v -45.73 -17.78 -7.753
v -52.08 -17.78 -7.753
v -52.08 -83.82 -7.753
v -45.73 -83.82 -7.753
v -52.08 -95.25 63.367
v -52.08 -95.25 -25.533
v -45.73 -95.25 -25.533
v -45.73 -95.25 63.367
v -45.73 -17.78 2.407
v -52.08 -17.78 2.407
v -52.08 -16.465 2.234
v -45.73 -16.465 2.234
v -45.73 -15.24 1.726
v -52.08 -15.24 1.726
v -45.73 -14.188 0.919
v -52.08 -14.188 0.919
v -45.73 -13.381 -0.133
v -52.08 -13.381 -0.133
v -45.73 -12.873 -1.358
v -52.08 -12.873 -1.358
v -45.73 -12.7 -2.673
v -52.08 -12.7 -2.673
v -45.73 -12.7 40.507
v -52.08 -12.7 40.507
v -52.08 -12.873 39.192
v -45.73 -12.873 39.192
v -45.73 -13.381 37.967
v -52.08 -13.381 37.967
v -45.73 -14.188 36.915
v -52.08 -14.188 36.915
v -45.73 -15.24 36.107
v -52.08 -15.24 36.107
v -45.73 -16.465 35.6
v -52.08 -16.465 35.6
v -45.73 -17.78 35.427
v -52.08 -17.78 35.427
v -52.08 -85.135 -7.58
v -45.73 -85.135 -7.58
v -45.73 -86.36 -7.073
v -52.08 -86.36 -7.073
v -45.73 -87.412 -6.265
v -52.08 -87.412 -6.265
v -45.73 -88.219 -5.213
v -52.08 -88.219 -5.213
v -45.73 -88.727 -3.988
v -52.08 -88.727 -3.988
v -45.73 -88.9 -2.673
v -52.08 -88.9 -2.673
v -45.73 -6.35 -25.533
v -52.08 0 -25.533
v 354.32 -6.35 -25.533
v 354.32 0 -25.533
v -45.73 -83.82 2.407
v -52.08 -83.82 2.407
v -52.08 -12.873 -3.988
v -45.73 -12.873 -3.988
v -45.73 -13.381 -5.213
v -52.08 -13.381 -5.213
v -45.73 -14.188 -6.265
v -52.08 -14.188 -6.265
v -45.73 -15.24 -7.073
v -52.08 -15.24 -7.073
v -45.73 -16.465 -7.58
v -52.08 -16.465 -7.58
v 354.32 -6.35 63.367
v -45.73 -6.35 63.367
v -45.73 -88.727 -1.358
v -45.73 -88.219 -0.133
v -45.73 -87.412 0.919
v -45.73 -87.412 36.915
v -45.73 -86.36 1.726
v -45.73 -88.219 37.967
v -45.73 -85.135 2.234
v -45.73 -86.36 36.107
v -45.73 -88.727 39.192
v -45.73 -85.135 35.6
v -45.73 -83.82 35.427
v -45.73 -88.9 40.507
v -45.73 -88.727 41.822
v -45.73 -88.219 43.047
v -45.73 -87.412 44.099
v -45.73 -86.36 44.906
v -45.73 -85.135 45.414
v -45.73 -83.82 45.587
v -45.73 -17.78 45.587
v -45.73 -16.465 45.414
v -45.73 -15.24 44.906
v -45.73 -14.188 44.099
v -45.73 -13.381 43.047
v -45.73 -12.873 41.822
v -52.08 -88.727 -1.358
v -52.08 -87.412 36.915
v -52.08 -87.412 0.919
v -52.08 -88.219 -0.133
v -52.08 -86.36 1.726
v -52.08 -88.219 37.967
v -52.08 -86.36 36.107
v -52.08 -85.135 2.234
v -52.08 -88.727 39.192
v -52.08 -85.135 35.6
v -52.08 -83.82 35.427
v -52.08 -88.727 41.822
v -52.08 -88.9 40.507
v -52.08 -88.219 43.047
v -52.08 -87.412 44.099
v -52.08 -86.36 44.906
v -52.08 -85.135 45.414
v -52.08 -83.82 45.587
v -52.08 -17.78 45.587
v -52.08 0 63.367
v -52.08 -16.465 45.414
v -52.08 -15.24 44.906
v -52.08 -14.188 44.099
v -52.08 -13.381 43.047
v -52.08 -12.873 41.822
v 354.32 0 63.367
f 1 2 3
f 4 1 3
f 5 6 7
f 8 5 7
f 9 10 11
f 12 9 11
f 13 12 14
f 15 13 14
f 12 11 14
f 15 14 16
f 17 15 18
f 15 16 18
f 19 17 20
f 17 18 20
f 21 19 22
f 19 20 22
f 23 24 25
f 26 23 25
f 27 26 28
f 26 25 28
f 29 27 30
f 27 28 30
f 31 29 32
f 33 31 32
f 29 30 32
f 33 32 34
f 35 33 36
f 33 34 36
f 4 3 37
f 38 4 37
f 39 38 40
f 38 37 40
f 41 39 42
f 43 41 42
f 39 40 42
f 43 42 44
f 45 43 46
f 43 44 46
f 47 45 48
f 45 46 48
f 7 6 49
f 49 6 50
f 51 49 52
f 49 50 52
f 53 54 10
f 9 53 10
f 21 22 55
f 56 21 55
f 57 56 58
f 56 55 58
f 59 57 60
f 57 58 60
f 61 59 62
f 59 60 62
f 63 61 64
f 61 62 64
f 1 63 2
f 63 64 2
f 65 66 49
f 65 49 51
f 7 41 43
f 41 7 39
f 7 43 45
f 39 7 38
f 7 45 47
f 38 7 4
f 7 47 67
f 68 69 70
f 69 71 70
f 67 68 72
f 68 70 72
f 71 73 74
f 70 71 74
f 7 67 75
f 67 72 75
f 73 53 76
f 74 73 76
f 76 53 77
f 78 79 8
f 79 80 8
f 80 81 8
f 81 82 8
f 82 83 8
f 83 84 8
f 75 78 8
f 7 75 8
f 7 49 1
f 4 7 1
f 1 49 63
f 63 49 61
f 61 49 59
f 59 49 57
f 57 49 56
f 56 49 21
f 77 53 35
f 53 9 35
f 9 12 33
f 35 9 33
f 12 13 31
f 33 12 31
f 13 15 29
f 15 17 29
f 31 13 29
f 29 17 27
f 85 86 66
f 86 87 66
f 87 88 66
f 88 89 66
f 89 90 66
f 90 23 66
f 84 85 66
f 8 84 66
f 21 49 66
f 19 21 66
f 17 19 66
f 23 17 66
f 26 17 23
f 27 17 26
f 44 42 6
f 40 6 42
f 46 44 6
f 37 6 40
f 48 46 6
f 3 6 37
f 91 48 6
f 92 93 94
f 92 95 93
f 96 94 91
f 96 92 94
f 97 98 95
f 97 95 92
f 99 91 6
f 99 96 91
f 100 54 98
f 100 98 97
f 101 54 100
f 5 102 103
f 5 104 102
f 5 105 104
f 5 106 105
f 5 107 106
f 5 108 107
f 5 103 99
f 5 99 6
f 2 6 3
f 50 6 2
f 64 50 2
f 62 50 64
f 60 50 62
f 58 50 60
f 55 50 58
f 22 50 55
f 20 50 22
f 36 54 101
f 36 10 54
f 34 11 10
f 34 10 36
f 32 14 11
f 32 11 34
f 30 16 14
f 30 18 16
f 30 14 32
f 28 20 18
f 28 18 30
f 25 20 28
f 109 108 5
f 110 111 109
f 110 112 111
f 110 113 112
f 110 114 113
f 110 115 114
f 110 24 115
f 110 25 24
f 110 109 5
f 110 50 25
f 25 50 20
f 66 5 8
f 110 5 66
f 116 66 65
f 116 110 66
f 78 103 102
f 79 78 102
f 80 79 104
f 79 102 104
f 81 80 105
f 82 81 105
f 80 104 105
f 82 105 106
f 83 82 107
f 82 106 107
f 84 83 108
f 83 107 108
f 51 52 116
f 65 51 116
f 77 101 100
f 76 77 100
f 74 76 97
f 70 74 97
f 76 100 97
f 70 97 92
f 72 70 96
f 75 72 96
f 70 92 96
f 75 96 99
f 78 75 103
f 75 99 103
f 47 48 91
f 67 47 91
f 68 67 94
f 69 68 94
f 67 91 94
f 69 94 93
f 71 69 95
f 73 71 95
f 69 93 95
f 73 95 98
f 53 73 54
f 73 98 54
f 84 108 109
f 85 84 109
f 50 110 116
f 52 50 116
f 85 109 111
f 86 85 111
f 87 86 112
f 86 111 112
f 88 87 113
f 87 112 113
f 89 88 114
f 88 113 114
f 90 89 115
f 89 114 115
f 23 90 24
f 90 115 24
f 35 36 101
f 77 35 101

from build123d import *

# Parameters (mm, degrees)
F0_W     = 406.4
F0_H     = 88.9
F1_DEPTH = 6.35
F2_W     = 6.35
F2_H     = 88.9
F3_DEPTH = 88.9
F5_DEPTH = 25.4


with BuildPart() as f1:
    # F0 (on Front) → F1 (new body)
    with BuildSketch(Plane.XZ):
        with Locations((151.11976, 18.916855)):
            Rectangle(F0_W, F0_H)
    extrude(amount=F1_DEPTH)

    # F2 (on face) → F3 (join)
    with BuildSketch(Plane.XZ.offset(6.35)):
        with Locations((-48.90524, 18.916855)):
            Rectangle(F2_W, F2_H)
    extrude(amount=F3_DEPTH)

    # F4 (on face) → F5 (cut)
    with BuildSketch(Plane(origin=(-52.08024, 0, 0), x_dir=(0, -1, 0), z_dir=(-1, 0, 0))):
        with BuildLine():
            Line((17.78, 35.426855), (17.78, 45.586855))
            ThreePointArc((17.78, 45.586855), (14.187898, 44.098957), (12.7, 40.506855))
            ThreePointArc((12.7, 40.506855), (14.187898, 36.914752), (17.78, 35.426855))
        make_face()
        with BuildLine():
            ThreePointArc((22.86, 40.506855), (21.372102, 44.098957), (17.78, 45.586855))
            Line((17.78, 45.586855), (17.78, 35.426855))
            ThreePointArc((17.78, 35.426855), (21.372102, 36.914752), (22.86, 40.506855))
        make_face()
        with BuildLine():
            ThreePointArc((12.7, -2.673145), (14.187898, -6.265248), (17.78, -7.753145))
            Line((17.78, -7.753145), (17.78, 2.406855))
            ThreePointArc((17.78, 2.406855), (14.187898, 0.918957), (12.7, -2.673145))
        make_face()
        with BuildLine():
            Line((17.78, 2.406855), (17.78, -7.753145))
            ThreePointArc((17.78, -7.753145), (21.372102, -6.265248), (22.86, -2.673145))
            ThreePointArc((22.86, -2.673145), (21.372102, 0.918957), (17.78, 2.406855))
        make_face()
        with BuildLine():
            ThreePointArc((83.82, 35.426855), (78.74, 40.506855), (83.82, 45.586855))
            Line((83.82, 45.586855), (17.78, 45.586855))
            ThreePointArc((17.78, 45.586855), (21.372102, 44.098957), (22.86, 40.506855))
            ThreePointArc((22.86, 40.506855), (21.372102, 36.914752), (17.78, 35.426855))
            Line((17.78, 35.426855), (83.82, 35.426855))
        make_face()
        with BuildLine():
            Line((83.82, 35.426855), (83.82, 45.586855))
            ThreePointArc((83.82, 45.586855), (78.74, 40.506855), (83.82, 35.426855))
        make_face()
        with BuildLine():
            ThreePointArc((83.82, 35.426855), (87.412102, 36.914752), (88.9, 40.506855))
            ThreePointArc((88.9, 40.506855), (87.412102, 44.098957), (83.82, 45.586855))
            Line((83.82, 45.586855), (83.82, 35.426855))
        make_face()
        with BuildLine():
            Line((17.78, -7.753145), (83.82, -7.753145))
            ThreePointArc((83.82, -7.753145), (78.74, -2.673145), (83.82, 2.406855))
            Line((83.82, 2.406855), (17.78, 2.406855))
            ThreePointArc((17.78, 2.406855), (21.372102, 0.918957), (22.86, -2.673145))
            ThreePointArc((22.86, -2.673145), (21.372102, -6.265248), (17.78, -7.753145))
        make_face()
        with BuildLine():
            ThreePointArc((83.82, 2.406855), (78.74, -2.673145), (83.82, -7.753145))
            Line((83.82, -7.753145), (83.82, 2.406855))
        make_face()
        with BuildLine():
            ThreePointArc((83.82, -7.753145), (87.412102, -6.265248), (88.9, -2.673145))
            ThreePointArc((88.9, -2.673145), (87.412102, 0.918957), (83.82, 2.406855))
            Line((83.82, 2.406855), (83.82, -7.753145))
        make_face()
    extrude(amount=-F5_DEPTH, mode=Mode.SUBTRACT)


solid = f1.part
